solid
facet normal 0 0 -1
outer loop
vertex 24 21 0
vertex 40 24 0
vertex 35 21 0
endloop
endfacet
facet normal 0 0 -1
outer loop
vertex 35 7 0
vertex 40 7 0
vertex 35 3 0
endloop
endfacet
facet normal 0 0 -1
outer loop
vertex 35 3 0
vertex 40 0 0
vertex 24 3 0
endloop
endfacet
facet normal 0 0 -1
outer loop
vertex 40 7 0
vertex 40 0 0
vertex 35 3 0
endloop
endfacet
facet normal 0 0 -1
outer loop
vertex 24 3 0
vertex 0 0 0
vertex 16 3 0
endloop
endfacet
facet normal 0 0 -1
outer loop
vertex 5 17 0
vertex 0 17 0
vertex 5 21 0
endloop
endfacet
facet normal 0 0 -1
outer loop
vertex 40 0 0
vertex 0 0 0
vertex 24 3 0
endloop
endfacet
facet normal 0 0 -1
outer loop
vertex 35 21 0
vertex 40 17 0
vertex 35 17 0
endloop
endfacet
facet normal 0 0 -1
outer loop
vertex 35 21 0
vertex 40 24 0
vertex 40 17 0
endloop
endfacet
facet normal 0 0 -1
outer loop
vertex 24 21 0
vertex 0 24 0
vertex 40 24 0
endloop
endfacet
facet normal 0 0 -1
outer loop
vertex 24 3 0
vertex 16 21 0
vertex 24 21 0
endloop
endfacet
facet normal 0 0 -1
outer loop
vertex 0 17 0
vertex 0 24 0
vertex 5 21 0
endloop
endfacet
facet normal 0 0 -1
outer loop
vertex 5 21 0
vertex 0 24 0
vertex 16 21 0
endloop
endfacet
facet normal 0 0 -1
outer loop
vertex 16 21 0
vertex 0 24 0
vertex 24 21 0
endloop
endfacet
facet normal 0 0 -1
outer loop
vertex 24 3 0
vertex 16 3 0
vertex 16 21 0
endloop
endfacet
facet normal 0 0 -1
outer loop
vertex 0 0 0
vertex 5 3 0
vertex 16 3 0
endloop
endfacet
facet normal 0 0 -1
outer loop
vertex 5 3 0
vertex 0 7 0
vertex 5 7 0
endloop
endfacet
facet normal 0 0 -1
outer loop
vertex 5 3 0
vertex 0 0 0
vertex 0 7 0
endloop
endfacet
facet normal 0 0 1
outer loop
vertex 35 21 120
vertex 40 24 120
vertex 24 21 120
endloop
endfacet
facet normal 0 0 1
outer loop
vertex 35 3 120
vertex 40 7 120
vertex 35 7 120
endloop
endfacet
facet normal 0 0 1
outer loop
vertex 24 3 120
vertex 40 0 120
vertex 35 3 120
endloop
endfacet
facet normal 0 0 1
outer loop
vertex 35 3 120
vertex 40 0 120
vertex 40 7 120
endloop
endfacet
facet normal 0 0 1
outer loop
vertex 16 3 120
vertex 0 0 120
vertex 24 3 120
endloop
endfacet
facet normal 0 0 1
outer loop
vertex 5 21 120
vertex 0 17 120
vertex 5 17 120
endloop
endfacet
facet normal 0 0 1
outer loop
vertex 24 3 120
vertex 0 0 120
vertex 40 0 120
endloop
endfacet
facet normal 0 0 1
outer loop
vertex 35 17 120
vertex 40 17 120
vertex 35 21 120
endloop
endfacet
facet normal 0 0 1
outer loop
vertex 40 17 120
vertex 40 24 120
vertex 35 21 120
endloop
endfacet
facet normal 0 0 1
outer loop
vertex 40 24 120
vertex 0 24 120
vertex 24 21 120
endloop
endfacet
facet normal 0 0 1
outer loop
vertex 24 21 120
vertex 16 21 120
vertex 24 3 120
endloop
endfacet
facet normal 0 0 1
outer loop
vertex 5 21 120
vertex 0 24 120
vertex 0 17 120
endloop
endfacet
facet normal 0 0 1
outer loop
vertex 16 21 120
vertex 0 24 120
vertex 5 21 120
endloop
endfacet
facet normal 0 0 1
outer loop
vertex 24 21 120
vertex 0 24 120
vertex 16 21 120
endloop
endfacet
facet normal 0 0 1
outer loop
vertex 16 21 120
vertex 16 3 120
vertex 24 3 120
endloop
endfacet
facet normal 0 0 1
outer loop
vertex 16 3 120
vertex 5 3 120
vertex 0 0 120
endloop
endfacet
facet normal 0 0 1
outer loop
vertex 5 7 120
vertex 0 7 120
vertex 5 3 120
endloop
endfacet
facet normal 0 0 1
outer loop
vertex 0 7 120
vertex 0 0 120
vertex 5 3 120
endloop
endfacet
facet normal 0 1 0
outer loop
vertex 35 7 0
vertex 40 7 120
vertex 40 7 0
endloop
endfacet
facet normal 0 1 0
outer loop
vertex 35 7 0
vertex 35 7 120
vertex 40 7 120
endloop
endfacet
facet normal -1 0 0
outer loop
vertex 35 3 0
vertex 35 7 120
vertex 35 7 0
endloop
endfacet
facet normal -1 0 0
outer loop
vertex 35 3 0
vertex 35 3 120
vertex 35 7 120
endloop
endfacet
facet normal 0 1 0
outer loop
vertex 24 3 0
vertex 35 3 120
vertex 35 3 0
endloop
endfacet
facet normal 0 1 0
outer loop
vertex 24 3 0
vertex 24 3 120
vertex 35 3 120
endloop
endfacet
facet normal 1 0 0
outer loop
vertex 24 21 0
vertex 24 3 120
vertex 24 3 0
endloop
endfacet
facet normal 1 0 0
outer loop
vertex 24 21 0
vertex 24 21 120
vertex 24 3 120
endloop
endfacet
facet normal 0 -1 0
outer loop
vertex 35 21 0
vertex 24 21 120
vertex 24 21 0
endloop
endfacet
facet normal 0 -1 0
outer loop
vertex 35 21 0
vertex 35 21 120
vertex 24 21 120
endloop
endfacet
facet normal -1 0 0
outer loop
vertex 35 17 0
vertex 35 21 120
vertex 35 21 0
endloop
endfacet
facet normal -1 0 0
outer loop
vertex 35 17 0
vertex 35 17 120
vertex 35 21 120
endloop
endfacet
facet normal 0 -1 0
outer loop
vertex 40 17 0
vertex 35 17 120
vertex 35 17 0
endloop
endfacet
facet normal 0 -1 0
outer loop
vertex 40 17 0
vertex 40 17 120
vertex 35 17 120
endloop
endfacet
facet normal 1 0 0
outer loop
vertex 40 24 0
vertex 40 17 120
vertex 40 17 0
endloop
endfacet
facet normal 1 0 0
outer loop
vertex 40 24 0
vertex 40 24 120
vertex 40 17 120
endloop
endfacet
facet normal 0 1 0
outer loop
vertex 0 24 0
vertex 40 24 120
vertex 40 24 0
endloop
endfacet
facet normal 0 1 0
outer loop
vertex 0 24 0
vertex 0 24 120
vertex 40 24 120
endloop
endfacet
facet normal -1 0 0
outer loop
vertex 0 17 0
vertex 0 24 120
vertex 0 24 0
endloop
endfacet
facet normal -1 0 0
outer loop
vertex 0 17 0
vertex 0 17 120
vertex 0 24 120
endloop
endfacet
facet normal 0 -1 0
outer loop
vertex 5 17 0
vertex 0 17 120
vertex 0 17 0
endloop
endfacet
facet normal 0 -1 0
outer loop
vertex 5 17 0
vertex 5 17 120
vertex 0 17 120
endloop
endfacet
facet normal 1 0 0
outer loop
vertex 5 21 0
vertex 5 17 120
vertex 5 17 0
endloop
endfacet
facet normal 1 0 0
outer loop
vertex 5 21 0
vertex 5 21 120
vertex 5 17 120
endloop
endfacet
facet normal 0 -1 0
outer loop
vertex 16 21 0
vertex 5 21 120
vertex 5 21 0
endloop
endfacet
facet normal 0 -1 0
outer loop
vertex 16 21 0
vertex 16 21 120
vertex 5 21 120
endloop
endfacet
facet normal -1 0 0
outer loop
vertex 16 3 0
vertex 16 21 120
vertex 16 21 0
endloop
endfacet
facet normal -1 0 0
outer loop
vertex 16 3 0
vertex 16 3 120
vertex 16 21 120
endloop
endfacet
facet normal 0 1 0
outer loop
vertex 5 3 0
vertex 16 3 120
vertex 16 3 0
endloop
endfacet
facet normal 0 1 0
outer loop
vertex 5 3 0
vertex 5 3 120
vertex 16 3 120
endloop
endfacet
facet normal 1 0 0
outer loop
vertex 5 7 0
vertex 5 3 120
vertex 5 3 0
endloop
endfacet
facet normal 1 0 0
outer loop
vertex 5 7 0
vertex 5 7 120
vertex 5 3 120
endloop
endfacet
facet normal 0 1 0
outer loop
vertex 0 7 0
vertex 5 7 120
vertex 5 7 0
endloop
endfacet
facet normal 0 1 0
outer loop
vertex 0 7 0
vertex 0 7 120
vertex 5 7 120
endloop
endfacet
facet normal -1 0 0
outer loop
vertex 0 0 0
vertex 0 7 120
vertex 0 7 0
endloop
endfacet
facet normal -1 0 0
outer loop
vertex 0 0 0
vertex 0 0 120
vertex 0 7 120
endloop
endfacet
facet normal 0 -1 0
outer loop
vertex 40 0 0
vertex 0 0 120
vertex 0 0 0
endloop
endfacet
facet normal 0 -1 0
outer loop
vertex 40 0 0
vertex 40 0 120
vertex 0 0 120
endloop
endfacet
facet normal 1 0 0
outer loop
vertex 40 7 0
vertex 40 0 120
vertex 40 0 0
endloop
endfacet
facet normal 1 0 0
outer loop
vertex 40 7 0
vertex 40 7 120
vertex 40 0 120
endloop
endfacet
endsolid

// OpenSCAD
$fn = 32;

// ----------------------------------------------------------------------
// T-slot rail: 40 x 24 mm section, 120 mm long
// ----------------------------------------------------------------------

// --- parameters (mm) ---
profile_height = 120;     // extrusion height
profile_points = 20;      // points of the closed outline

profile = [[0, 0], [40, 0], [40, 7], [35, 7], [35, 3], [24, 3], [24, 21], [35, 21], [35, 17], [40, 17], [40, 24], [0, 24], [0, 17], [5, 17], [5, 21], [16, 21], [16, 3], [5, 3], [5, 7], [0, 7]];  // single closed polygon, 20 points, counter clockwise

// --- the one profile operation ---
linear_extrude(height = profile_height) polygon(points = profile);
